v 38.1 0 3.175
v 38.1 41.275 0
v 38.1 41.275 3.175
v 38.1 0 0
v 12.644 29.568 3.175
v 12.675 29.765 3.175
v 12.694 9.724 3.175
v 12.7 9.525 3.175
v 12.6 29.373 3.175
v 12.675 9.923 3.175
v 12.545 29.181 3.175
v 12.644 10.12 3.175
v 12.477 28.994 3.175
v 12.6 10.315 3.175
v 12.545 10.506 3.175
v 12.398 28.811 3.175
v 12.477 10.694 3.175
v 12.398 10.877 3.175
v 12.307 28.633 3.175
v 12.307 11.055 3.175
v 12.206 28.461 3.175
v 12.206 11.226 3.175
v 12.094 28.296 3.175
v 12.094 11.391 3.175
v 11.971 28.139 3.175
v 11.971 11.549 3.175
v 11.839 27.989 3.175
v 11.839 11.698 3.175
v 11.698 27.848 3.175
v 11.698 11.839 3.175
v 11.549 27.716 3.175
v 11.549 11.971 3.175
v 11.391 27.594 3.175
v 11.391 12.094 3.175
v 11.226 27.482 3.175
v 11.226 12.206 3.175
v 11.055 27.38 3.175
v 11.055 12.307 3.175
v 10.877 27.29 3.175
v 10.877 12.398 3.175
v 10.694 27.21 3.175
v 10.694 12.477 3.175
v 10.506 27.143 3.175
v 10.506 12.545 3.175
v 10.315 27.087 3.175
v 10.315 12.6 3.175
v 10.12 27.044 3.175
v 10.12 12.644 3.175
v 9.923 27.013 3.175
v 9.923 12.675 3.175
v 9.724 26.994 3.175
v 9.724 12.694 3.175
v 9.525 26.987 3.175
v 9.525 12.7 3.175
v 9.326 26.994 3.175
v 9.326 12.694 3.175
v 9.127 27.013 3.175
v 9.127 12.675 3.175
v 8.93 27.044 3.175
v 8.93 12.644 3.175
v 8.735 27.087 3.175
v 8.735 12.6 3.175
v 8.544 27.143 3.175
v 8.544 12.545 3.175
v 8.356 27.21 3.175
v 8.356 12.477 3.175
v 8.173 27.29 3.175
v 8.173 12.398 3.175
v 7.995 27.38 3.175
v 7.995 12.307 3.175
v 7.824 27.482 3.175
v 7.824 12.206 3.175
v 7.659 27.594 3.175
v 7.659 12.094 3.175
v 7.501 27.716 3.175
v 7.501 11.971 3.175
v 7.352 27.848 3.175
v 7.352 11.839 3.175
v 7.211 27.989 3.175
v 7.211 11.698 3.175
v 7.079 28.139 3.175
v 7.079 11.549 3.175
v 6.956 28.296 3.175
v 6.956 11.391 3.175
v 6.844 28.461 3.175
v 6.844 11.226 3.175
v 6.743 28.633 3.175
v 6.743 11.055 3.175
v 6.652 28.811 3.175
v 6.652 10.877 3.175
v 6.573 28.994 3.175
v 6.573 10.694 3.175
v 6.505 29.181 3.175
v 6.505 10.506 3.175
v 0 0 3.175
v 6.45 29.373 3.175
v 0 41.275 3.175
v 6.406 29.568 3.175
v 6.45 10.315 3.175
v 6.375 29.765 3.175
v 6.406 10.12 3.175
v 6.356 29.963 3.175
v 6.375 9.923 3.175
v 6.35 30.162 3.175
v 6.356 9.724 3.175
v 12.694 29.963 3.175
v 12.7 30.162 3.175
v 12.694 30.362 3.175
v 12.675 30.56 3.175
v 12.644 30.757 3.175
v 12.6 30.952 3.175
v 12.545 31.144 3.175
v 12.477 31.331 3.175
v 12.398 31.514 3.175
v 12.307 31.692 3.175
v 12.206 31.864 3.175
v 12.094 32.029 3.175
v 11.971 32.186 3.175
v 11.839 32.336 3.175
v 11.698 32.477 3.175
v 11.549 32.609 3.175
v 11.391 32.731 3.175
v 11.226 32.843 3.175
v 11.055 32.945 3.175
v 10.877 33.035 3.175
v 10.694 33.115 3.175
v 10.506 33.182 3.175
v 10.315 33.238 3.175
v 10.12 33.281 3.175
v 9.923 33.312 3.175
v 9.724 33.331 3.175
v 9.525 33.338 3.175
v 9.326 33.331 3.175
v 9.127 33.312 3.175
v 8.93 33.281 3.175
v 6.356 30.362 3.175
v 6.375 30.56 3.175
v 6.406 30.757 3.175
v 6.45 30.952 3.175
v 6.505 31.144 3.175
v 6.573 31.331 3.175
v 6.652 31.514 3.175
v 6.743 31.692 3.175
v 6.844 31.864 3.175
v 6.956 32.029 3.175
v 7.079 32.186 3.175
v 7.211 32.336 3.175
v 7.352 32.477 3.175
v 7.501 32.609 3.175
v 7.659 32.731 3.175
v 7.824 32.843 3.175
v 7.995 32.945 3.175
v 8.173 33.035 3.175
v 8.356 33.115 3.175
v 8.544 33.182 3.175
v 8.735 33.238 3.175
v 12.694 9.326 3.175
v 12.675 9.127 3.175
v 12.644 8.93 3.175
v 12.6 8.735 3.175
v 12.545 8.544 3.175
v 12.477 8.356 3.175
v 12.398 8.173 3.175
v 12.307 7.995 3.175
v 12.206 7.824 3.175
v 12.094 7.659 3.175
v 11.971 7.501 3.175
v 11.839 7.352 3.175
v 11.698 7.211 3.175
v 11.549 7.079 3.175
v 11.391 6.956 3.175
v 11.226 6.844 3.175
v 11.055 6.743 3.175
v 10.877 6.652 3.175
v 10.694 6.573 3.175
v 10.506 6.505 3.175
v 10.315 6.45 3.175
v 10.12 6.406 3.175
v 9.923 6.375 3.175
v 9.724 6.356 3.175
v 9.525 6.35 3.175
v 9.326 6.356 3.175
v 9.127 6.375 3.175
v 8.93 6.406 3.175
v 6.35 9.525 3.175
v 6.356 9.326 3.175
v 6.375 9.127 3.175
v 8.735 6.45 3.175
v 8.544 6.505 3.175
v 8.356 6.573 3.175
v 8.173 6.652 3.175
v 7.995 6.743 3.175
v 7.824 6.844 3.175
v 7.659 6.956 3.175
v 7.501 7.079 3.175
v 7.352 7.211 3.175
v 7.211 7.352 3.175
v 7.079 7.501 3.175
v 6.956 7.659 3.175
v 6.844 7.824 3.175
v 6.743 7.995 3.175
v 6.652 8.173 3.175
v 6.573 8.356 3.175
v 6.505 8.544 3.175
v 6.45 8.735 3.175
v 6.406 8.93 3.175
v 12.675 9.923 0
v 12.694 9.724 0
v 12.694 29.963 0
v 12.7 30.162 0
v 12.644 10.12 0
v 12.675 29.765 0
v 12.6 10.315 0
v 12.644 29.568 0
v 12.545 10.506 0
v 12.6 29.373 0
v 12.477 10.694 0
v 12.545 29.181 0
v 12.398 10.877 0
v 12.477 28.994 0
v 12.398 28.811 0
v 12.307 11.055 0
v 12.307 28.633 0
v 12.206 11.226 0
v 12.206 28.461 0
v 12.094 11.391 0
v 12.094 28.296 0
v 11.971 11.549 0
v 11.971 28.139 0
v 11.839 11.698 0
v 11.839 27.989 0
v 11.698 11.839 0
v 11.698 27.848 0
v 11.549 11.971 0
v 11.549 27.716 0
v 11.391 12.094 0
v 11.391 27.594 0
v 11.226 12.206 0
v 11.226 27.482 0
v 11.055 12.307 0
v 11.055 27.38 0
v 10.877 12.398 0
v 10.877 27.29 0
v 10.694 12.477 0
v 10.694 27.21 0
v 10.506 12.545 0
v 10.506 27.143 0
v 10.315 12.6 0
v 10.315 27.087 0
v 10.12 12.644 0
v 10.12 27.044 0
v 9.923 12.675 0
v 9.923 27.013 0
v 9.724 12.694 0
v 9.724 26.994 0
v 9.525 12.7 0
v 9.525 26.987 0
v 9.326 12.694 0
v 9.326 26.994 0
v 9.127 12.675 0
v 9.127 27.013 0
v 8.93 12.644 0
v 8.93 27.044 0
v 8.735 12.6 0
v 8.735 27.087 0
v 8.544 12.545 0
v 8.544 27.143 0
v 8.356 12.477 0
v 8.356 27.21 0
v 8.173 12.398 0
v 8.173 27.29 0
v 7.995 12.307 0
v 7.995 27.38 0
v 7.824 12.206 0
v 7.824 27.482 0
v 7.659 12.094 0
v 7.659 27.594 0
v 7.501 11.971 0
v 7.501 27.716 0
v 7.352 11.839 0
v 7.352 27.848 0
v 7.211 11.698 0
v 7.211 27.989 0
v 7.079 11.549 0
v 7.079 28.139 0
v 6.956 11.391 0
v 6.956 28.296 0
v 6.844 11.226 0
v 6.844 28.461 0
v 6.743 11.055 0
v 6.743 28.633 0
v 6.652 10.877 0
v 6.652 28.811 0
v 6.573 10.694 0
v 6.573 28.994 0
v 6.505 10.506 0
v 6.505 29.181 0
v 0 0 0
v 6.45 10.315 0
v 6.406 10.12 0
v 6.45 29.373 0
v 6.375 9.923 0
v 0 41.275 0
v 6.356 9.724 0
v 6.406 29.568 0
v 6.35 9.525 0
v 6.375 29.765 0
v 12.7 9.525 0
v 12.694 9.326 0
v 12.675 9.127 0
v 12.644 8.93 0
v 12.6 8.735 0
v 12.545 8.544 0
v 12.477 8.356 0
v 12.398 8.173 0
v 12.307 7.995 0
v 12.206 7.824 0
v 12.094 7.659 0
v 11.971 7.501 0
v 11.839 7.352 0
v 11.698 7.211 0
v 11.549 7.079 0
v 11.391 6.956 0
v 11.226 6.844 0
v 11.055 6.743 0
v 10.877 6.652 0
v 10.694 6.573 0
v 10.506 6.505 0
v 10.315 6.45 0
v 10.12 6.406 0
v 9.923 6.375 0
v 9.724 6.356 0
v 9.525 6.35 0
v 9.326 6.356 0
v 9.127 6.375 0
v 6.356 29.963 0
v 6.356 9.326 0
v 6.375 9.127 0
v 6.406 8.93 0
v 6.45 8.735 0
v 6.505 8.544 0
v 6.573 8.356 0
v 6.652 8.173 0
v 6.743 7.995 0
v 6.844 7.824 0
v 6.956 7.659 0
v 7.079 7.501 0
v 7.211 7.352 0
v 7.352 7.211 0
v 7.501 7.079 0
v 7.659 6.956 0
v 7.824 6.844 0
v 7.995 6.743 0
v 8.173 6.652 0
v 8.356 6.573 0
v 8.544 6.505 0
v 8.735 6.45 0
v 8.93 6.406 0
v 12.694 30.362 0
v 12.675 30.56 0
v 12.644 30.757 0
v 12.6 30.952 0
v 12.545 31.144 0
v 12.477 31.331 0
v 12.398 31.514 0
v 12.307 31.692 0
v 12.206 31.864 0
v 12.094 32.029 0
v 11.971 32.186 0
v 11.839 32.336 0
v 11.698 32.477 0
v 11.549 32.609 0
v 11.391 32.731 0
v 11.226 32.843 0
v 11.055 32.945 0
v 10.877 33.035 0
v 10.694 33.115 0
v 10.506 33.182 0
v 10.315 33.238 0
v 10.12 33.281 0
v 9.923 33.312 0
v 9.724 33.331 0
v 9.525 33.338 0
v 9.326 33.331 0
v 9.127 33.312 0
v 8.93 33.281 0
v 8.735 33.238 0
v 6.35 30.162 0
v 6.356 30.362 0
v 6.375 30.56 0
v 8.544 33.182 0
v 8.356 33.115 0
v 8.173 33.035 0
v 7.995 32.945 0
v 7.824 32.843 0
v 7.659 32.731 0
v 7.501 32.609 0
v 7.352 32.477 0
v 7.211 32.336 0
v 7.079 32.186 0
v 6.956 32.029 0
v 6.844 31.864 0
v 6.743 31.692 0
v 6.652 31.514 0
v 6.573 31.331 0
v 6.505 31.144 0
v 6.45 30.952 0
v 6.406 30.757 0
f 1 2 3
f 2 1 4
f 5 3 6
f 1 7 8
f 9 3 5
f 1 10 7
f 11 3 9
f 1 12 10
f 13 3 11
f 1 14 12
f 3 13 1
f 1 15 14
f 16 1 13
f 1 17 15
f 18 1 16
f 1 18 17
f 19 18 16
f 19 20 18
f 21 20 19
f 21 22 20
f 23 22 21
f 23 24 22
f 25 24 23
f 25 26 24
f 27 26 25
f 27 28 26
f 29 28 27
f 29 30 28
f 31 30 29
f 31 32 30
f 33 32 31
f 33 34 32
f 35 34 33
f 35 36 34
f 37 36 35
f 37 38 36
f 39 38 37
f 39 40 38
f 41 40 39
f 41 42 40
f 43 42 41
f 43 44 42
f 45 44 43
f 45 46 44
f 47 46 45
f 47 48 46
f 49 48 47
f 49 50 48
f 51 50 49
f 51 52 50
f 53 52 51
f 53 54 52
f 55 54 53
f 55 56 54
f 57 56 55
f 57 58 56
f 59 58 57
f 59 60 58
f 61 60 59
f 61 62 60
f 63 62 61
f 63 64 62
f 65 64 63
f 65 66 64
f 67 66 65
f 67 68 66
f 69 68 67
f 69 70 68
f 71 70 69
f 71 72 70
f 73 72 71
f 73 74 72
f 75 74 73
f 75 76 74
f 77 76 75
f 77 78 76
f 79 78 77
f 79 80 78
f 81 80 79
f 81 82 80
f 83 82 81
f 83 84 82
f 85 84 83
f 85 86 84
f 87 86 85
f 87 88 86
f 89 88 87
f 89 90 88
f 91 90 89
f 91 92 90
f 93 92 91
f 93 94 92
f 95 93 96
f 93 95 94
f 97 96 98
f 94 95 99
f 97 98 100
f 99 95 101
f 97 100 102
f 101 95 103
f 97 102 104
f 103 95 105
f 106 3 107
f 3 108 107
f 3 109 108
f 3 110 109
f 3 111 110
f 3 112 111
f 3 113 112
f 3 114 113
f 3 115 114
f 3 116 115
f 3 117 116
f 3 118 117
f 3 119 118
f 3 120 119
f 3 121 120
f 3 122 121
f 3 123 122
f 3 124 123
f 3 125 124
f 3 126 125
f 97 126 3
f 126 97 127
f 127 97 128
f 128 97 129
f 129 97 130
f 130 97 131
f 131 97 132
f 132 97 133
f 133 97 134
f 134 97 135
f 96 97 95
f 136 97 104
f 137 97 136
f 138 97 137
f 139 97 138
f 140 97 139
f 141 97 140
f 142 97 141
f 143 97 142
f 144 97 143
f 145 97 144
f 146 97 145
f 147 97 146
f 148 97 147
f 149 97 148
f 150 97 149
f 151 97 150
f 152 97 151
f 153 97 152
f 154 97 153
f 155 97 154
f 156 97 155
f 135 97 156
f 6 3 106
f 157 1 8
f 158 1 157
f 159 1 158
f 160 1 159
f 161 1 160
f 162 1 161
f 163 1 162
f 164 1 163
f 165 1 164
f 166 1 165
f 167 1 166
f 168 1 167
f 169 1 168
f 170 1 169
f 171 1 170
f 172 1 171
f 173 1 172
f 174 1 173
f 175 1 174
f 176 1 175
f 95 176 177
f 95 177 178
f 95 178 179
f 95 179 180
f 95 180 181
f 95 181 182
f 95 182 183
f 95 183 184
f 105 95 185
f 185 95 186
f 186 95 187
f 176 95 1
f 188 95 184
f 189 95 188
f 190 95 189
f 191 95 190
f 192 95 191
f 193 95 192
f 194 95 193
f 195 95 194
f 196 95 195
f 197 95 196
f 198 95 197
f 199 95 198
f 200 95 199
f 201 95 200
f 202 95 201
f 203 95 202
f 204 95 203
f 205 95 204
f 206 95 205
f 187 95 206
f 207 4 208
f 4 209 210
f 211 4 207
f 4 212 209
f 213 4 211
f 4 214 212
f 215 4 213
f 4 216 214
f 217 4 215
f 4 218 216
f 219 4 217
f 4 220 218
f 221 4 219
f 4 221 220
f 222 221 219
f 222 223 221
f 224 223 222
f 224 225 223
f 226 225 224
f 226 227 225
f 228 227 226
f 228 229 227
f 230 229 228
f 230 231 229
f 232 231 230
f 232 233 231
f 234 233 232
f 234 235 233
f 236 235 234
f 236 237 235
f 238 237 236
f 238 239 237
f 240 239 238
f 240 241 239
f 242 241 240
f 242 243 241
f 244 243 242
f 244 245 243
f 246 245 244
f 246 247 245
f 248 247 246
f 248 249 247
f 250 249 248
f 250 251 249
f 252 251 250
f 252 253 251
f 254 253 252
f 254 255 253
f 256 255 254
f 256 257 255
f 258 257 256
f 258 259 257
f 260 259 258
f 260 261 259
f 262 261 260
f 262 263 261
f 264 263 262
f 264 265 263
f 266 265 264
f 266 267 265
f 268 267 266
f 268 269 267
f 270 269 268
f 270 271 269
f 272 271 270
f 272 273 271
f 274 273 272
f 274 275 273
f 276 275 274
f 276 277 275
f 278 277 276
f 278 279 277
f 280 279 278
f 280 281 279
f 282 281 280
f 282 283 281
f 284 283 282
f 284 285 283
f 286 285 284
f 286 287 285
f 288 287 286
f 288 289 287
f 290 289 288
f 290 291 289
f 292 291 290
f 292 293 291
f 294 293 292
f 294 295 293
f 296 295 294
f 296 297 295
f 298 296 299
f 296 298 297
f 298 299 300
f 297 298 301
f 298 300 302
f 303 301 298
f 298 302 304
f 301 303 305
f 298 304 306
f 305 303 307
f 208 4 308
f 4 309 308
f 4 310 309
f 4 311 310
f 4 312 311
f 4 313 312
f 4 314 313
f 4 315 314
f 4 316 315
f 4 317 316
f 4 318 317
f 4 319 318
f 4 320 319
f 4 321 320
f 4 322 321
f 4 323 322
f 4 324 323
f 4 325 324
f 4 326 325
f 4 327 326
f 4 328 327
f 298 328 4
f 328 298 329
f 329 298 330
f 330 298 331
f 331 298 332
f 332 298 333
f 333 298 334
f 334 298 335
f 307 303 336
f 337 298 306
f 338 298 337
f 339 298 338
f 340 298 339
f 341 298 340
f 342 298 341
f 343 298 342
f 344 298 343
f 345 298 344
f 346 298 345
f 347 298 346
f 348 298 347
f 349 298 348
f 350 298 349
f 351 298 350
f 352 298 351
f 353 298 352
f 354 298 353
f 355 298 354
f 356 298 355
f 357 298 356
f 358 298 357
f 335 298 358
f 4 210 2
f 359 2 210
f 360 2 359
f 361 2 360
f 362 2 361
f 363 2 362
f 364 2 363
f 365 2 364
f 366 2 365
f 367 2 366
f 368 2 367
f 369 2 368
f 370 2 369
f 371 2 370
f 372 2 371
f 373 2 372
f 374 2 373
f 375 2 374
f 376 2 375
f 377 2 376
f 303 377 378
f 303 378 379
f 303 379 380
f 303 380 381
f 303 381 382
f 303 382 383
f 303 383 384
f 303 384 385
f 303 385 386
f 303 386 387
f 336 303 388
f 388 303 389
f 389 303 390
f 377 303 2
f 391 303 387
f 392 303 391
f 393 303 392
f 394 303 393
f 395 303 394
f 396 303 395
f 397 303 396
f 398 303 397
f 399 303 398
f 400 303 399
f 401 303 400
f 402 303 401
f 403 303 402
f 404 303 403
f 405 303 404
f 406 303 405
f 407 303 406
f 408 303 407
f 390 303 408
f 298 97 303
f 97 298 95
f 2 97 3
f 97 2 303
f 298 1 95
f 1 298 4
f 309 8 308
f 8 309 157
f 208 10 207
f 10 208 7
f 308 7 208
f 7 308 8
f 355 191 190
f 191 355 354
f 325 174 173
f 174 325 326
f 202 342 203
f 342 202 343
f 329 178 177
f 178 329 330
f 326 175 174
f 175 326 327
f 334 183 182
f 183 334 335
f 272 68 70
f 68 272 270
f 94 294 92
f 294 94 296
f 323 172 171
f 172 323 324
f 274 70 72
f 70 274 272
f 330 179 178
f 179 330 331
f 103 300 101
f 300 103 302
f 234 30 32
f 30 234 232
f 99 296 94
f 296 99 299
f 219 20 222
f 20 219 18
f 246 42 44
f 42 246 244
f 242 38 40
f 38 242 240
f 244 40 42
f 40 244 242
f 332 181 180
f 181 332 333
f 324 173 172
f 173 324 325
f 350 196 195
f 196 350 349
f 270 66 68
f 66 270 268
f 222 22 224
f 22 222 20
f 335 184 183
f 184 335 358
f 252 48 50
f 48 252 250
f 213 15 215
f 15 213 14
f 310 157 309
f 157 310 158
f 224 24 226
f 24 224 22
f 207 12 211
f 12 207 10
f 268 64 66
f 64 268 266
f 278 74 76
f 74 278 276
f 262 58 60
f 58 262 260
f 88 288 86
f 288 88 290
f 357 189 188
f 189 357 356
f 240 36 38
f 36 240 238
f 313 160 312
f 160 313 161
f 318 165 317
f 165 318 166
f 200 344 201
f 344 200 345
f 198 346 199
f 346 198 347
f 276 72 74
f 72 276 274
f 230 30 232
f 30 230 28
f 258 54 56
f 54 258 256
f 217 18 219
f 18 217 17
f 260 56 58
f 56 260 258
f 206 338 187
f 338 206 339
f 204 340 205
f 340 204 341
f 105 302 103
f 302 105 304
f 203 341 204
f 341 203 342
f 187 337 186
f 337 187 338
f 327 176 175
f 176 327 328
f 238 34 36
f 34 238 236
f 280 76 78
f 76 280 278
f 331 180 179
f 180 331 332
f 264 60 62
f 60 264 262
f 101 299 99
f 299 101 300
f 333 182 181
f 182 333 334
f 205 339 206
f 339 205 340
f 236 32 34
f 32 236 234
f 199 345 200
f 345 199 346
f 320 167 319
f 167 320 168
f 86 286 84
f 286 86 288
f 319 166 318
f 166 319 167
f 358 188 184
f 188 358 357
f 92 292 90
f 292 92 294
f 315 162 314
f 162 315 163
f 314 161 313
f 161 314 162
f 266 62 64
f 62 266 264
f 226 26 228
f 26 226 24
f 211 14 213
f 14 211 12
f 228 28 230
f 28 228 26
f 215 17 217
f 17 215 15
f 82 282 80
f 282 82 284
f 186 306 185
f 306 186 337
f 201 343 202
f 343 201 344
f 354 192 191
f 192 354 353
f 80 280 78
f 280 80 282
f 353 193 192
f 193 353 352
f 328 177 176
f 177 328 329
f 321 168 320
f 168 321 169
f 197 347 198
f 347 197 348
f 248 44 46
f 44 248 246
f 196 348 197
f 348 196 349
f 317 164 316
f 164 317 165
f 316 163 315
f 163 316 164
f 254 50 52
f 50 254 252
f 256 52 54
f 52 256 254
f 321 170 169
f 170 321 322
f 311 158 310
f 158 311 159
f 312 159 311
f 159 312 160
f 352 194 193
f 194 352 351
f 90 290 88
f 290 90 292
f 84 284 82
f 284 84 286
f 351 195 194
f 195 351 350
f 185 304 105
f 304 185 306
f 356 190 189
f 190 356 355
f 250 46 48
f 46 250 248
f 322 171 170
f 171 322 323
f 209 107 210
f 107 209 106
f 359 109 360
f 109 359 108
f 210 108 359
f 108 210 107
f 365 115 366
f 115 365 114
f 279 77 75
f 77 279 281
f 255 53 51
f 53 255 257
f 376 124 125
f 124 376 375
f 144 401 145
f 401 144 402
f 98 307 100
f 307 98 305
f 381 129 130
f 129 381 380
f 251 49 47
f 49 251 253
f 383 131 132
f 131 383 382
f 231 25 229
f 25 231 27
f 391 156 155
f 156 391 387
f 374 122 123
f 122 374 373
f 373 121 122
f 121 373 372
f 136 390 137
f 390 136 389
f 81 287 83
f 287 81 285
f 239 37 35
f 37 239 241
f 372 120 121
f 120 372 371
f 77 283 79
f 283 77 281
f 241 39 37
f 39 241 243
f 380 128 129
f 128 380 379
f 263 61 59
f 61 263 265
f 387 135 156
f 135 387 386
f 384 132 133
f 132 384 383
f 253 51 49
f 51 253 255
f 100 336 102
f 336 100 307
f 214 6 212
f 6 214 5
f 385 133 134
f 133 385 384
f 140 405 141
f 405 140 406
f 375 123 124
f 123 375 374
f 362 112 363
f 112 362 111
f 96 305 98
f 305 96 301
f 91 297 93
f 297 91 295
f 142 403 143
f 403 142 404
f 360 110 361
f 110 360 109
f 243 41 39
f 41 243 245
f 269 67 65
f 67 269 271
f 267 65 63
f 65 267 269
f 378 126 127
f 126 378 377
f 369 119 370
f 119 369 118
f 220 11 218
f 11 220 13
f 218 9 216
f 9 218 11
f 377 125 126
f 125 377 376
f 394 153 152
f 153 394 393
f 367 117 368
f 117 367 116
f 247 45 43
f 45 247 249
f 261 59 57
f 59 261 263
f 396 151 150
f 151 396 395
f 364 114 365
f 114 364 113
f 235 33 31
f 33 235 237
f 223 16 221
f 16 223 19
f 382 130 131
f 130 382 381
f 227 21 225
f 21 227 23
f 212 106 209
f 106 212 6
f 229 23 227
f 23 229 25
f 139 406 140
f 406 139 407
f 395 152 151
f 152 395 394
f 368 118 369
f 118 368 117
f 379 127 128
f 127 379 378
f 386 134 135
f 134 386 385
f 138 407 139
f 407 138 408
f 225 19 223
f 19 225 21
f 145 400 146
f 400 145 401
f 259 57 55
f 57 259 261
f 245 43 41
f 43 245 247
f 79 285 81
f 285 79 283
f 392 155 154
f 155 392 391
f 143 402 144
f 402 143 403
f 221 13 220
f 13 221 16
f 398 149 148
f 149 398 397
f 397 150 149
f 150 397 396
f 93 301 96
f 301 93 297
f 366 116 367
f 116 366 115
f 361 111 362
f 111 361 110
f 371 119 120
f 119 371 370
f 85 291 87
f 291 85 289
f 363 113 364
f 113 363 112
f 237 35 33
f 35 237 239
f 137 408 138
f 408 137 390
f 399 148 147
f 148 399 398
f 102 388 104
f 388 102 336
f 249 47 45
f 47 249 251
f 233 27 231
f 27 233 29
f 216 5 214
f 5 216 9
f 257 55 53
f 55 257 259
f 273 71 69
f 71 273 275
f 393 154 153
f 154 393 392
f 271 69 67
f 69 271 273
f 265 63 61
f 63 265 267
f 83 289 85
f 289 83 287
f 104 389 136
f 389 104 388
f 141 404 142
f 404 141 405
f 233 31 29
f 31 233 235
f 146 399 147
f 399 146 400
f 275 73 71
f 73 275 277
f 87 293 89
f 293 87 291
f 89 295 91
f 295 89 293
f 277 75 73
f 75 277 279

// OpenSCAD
$fn=100;

function in_to_mm(x) = x*(25.4);

PLATE_X = in_to_mm(1.5);
PLATE_Y = in_to_mm((8+5)/8);
PLATE_Z = in_to_mm(1/8);
SCREW_HOLE_RADIUS = in_to_mm((2/8)/2);

module screw_hole () {
  cylinder(r=SCREW_HOLE_RADIUS,h=PLATE_Z); 
};

difference() { 
  cube([in_to_mm(1.5),in_to_mm((8+5)/8),in_to_mm(1/8)]);
  translate([in_to_mm(3/8),in_to_mm(3/8),0])
    screw_hole();
  #translate([
    in_to_mm(3/8),
    in_to_mm(9.5/8),
    0
  ])
    screw_hole();
}
